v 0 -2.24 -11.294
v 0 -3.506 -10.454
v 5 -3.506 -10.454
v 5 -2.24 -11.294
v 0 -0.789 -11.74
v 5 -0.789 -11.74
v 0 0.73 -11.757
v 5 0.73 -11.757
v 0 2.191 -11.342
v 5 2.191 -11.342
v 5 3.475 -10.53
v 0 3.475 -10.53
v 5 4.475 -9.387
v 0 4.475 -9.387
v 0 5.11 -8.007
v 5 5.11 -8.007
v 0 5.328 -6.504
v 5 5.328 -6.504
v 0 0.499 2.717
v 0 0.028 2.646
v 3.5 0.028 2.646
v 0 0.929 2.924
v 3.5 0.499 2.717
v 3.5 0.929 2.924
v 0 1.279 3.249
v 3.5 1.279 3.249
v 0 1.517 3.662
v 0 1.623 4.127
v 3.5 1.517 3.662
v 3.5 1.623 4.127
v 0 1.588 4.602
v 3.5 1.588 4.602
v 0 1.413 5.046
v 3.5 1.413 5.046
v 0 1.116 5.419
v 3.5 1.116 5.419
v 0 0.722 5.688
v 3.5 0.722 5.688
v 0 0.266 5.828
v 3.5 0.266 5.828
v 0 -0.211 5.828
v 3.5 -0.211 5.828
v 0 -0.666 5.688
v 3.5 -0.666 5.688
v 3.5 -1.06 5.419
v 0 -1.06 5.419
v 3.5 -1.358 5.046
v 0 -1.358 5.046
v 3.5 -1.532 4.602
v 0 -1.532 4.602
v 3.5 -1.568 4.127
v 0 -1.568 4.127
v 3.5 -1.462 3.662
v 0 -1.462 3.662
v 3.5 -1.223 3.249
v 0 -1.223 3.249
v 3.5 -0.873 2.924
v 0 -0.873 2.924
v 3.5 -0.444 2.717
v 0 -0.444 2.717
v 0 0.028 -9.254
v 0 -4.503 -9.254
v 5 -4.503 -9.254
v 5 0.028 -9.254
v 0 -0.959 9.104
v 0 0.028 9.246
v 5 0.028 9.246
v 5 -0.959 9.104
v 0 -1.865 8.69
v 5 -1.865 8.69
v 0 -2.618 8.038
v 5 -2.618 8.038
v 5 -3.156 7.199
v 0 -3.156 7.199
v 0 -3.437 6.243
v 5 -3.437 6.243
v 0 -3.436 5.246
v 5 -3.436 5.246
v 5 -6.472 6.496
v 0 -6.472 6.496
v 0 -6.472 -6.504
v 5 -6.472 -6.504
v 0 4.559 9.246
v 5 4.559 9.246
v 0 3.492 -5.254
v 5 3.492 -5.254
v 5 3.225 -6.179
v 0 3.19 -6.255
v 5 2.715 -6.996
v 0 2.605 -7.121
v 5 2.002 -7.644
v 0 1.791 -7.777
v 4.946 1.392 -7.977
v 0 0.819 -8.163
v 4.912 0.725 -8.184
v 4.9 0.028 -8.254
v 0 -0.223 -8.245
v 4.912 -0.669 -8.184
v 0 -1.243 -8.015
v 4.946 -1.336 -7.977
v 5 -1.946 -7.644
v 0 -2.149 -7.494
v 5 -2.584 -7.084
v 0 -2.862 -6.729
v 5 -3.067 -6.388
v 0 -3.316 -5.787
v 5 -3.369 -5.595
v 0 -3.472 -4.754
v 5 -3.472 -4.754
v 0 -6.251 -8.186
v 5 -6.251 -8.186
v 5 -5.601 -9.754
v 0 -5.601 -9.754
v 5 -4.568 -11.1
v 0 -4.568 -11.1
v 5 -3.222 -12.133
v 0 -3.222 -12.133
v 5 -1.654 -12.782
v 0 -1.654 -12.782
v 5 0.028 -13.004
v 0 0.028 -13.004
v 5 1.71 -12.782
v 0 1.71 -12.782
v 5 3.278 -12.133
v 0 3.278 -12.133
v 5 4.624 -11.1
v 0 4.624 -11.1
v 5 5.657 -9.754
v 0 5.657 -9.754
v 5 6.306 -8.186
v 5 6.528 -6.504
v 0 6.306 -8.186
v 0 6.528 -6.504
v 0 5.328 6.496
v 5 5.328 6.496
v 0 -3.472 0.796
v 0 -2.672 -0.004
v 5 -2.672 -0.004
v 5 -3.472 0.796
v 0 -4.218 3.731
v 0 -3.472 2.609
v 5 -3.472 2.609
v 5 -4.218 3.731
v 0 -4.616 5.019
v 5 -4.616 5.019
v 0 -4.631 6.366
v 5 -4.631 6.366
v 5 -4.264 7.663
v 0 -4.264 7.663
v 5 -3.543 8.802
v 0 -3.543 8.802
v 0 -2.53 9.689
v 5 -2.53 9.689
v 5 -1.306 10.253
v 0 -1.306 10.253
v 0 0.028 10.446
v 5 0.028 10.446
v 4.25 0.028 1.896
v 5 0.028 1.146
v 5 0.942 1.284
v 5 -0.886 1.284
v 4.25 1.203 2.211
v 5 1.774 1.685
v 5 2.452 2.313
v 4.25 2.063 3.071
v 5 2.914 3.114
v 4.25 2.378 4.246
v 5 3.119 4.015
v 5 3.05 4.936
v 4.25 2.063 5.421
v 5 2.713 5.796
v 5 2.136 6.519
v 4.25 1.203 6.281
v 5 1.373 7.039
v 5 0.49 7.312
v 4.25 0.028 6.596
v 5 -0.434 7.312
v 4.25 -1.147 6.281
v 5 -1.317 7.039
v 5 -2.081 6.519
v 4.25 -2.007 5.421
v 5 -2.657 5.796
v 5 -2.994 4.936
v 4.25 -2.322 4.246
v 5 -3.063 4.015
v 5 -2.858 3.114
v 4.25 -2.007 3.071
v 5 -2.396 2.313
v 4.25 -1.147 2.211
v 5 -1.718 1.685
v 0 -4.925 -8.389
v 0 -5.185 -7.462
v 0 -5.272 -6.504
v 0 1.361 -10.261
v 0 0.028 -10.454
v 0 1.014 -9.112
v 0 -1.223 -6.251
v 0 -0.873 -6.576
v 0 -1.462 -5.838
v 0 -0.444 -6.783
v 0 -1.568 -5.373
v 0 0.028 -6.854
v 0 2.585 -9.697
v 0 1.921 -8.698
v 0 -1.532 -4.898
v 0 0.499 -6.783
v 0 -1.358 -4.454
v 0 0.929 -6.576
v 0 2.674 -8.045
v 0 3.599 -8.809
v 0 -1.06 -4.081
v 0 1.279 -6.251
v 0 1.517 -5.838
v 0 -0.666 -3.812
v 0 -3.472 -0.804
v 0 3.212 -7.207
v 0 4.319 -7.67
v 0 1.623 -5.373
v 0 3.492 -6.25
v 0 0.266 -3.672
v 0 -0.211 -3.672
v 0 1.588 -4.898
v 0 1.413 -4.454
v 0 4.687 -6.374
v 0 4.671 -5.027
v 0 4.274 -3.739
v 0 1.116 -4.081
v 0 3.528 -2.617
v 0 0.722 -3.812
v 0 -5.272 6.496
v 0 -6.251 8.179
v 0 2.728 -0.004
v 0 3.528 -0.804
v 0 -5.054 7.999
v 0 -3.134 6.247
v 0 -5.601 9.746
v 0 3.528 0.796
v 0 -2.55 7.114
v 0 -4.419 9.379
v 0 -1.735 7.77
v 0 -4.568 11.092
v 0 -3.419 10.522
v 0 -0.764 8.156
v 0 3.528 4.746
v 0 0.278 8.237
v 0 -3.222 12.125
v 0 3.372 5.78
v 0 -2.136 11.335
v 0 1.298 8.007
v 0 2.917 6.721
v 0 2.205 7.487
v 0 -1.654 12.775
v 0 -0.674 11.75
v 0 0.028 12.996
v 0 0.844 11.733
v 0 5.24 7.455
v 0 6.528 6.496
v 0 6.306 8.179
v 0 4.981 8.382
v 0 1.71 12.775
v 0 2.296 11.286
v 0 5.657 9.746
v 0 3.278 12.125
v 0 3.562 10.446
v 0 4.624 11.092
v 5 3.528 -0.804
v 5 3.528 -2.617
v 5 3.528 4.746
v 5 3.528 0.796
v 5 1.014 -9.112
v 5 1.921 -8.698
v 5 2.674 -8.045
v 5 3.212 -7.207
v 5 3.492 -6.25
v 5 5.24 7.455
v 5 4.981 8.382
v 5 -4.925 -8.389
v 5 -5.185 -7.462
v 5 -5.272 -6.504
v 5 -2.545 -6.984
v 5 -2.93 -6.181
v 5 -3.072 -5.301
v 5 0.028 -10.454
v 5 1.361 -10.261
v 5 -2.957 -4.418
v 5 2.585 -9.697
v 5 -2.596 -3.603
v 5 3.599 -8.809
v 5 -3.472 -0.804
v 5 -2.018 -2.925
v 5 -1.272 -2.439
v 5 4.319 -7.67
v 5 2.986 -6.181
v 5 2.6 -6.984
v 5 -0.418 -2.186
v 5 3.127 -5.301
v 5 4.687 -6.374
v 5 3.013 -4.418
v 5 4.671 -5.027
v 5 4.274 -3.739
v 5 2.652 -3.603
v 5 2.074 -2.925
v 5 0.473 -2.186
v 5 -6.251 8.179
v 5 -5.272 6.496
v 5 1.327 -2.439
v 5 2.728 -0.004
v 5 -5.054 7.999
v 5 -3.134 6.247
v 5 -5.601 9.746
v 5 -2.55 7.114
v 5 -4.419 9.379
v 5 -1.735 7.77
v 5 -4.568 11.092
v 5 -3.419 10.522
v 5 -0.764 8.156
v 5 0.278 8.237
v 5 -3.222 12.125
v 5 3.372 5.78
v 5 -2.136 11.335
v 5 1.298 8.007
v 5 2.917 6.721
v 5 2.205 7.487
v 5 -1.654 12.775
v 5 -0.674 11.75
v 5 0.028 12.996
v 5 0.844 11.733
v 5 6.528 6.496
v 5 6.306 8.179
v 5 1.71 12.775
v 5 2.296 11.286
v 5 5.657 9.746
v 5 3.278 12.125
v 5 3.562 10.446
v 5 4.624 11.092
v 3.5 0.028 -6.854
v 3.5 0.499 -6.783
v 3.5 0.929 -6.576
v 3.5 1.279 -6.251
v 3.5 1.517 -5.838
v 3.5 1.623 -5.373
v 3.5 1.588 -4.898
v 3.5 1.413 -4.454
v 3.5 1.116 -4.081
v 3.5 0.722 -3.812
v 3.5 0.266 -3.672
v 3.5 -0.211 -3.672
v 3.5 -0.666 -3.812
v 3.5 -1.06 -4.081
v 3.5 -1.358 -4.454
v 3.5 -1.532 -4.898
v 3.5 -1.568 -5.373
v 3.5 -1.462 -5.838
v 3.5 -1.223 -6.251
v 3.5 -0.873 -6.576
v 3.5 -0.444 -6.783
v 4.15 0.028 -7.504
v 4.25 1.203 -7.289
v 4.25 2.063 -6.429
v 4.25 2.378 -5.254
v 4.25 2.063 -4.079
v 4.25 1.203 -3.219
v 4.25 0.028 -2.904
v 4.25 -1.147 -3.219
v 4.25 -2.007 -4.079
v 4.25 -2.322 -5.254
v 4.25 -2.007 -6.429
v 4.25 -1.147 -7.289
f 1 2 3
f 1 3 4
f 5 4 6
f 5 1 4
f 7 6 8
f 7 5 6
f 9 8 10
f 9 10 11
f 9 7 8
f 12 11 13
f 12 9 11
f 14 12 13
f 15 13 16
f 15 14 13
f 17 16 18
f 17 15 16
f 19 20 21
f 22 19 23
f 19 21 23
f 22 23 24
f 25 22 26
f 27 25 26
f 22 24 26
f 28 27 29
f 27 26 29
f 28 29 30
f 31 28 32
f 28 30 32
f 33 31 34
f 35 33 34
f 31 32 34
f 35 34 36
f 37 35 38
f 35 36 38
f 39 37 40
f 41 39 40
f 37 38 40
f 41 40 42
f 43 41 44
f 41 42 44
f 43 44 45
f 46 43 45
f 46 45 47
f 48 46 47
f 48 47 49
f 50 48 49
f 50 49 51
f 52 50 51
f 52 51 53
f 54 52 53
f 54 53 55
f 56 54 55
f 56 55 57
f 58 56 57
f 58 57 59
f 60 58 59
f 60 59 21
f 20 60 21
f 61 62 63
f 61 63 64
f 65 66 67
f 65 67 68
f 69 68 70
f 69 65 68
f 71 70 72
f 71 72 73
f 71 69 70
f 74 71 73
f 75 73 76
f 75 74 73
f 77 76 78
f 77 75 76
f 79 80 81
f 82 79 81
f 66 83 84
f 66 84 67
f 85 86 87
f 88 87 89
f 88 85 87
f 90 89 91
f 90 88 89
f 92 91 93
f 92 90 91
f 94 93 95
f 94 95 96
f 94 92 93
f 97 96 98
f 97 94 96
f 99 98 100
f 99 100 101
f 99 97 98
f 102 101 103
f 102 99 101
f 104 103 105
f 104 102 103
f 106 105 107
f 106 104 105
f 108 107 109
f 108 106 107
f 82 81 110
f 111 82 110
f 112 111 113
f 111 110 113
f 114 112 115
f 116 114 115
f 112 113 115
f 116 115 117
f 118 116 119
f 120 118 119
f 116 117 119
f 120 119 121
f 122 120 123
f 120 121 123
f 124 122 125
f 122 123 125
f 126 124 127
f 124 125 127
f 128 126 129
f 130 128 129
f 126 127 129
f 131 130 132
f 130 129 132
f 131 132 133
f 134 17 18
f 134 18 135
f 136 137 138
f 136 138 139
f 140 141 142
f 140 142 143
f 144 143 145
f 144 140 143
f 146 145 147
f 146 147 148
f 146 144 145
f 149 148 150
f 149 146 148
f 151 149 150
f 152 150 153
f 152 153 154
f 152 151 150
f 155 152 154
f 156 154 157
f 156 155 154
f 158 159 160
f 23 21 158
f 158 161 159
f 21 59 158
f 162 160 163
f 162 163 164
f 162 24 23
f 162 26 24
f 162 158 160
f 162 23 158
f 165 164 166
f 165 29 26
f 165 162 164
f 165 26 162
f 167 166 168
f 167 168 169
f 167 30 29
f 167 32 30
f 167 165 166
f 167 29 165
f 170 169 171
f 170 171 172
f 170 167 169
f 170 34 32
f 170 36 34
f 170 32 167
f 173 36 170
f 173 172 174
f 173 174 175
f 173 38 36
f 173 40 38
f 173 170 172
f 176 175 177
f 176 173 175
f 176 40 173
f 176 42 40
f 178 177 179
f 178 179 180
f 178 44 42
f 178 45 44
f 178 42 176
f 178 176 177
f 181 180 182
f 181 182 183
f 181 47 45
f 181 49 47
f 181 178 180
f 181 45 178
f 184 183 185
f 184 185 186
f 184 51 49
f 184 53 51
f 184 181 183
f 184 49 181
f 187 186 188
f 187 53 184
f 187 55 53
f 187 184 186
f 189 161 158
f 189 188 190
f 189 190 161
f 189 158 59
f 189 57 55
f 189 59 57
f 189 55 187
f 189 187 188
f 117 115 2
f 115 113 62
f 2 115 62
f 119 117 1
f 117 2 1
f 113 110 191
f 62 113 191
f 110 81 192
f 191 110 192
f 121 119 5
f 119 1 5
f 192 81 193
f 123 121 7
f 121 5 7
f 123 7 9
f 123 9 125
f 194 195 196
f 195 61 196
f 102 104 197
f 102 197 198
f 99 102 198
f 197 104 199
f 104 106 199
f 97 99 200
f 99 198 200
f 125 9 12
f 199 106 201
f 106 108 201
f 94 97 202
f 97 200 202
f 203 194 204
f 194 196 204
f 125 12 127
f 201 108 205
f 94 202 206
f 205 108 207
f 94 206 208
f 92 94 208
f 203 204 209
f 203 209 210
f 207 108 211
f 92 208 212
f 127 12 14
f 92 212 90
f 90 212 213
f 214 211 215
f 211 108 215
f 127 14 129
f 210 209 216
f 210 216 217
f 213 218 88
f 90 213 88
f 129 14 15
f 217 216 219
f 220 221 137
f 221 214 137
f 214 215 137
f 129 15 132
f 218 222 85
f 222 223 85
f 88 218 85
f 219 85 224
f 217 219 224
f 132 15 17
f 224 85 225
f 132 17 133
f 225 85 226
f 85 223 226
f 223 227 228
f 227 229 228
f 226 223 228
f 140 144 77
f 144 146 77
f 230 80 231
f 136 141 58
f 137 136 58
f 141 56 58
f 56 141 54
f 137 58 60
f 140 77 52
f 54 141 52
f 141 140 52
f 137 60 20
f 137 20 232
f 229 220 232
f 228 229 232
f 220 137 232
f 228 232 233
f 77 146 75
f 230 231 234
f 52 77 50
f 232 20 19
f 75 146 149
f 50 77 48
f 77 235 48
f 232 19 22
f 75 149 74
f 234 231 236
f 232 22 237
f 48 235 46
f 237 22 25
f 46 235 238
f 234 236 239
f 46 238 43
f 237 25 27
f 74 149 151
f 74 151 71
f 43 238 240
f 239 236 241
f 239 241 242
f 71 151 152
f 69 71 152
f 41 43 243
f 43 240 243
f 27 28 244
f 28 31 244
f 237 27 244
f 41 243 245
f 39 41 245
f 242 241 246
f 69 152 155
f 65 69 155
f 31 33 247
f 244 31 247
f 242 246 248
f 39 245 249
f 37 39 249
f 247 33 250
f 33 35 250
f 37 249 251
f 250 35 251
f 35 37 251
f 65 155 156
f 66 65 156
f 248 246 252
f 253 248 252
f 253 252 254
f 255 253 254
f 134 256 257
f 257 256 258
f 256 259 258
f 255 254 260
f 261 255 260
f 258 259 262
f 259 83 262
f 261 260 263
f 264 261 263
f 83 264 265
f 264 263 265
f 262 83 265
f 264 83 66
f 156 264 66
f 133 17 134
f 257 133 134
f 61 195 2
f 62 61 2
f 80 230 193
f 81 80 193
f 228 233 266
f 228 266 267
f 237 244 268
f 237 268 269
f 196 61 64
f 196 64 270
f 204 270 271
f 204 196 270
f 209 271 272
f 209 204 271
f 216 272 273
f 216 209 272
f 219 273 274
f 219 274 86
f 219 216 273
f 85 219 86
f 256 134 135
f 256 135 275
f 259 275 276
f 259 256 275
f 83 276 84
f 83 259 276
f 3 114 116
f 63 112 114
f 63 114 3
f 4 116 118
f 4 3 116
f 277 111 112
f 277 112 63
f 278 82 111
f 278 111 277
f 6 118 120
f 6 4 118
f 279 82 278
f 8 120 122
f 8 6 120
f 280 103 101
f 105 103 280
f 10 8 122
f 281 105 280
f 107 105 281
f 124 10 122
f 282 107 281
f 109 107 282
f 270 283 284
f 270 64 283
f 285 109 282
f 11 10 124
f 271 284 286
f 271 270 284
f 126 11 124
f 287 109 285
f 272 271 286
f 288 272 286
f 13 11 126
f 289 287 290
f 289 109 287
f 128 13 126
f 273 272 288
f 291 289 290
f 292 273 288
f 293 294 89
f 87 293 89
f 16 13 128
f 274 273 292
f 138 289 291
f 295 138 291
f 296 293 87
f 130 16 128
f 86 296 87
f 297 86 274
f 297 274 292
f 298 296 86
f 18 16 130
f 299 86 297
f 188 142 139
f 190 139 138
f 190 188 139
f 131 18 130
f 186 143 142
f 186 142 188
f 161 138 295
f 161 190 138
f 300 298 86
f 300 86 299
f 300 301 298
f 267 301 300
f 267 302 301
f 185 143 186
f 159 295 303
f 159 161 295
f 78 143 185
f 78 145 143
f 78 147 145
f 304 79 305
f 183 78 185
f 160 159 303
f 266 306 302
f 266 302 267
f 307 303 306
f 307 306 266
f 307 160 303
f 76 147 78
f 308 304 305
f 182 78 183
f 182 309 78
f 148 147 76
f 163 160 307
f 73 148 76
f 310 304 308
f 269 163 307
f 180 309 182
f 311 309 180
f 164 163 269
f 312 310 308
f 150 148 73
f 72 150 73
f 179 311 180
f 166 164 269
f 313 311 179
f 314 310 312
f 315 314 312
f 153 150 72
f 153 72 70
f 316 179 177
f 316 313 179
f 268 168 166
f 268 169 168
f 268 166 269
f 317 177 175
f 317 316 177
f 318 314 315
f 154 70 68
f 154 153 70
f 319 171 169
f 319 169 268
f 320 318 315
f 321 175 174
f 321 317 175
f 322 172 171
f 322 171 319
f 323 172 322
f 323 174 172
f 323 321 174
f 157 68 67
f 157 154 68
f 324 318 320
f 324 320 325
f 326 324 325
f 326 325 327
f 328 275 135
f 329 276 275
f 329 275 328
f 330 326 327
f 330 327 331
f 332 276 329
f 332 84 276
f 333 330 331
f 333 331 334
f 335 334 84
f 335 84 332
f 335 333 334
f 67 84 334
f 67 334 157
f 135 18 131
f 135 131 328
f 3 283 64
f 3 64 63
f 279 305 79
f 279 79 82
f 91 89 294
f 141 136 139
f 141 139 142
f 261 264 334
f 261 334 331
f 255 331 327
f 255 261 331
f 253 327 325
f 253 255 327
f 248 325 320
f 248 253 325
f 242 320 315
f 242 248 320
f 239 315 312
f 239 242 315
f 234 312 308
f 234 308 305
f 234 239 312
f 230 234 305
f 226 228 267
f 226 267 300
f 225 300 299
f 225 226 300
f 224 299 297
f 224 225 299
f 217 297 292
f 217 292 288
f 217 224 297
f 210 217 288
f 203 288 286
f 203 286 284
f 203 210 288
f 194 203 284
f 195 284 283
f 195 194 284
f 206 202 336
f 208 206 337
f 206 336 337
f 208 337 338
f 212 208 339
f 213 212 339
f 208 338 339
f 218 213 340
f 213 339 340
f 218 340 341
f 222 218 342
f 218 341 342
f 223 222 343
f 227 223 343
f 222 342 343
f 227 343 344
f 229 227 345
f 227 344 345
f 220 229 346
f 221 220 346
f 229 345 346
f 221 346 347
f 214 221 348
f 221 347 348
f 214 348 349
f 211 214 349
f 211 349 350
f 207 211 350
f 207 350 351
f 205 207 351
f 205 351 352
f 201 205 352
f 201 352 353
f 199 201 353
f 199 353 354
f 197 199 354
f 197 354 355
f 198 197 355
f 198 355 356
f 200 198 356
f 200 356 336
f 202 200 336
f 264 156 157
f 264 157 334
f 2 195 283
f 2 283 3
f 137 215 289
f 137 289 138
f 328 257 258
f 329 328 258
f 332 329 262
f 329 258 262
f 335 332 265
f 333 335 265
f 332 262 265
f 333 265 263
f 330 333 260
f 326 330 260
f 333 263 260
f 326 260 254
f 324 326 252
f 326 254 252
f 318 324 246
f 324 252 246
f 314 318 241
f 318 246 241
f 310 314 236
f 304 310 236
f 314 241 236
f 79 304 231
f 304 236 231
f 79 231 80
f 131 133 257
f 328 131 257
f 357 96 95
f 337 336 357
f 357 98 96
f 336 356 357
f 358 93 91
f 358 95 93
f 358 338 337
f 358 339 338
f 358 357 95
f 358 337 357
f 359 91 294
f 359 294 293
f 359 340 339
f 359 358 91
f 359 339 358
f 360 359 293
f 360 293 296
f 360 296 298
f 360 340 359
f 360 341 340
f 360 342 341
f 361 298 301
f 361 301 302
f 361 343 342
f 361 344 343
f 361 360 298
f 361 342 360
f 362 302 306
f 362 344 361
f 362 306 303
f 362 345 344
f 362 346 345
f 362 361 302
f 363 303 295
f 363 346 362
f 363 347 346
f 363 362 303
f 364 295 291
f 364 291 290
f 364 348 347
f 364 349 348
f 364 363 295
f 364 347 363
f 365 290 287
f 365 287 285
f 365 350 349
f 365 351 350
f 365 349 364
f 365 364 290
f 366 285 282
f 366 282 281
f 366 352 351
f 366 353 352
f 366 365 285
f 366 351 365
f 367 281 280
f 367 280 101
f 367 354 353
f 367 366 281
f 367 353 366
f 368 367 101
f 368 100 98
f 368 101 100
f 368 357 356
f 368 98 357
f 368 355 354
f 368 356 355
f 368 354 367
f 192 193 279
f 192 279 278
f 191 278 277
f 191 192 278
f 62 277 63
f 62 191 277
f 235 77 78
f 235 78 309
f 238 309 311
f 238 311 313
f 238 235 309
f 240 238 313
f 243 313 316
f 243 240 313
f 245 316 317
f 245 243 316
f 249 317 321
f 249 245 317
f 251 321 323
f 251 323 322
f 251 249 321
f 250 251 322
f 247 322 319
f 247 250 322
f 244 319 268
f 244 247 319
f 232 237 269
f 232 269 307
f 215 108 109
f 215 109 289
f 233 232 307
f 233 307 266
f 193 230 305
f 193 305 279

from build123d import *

# Parameters (mm, degrees)
BOSS_EXTRUDE2_DEPTH = 5
SKETCH4_R           = 1.6
CUT_EXTRUDE1_DEPTH  = 10
CHAMFER1_SIZE       = 1.5


with BuildPart() as part:
    # Sketch2 → Boss-Extrude2 (new body)
    with BuildSketch(Plane.YZ):
        with BuildLine():
            Line((-6.472145094, 6.496243265), (-6.472145094, -6.503756735))
            ThreePointArc((-6.472145094, -6.503756735), (0.027854906, -13.003756735), (6.527854906, -6.503756735))
            Line((6.527854906, -6.503756735), (6.527854906, 6.496243265))
            ThreePointArc((6.527854906, 6.496243265), (0.027854906, 12.996243265), (-6.472145094, 6.496243265))
        make_face()
        with BuildLine():
            Line((-5.272145094, 6.496243265), (-5.272145094, -6.503756735))
            ThreePointArc((-5.272145094, -6.503756735), (-5.076205272, -7.931541625), (-4.502873512, -9.253756735))
            Line((-4.502873512, -9.253756735), (0.027854906, -9.253756735))
            ThreePointArc((0.027854906, -9.253756735), (2.673606218, -8.045044583), (3.491956522, -5.253756735))
            ThreePointArc((3.491956522, -5.253756735), (-0.222788612, -8.244770603), (-3.472145094, -4.753756735))
            Line((-3.472145094, -4.753756735), (-3.472145094, -0.803756735))
            Line((-3.472145094, -0.803756735), (-2.672145094, -0.003756735))
            Line((-2.672145094, -0.003756735), (-3.472145094, 0.796243265))
            Line((-3.472145094, 0.796243265), (-3.472145094, 2.609365837))
            ThreePointArc((-3.472145094, 2.609365837), (-4.263608941, 7.662838695), (0.027854906, 10.446243265))
            Line((0.027854906, 10.446243265), (3.561620603, 10.446243265))
            ThreePointArc((3.561620603, 10.446243265), (-2.135596249, 11.334577596), (-5.272145094, 6.496243265))
        make_face(mode=Mode.SUBTRACT)
        with BuildLine():
            Line((4.558583325, 9.246243265), (0.027854906, 9.246243265))
            ThreePointArc((0.027854906, 9.246243265), (-2.617896405, 8.037531112), (-3.436246709, 5.246243265))
            ThreePointArc((-3.436246709, 5.246243265), (0.278498425, 8.237257133), (3.527854906, 4.746243265))
            Line((3.527854906, 4.746243265), (3.527854906, 0.796243265))
            Line((3.527854906, 0.796243265), (2.727854906, -0.003756735))
            Line((2.727854906, -0.003756735), (3.527854906, -0.803756735))
            Line((3.527854906, -0.803756735), (3.527854906, -2.616879307))
            ThreePointArc((3.527854906, -2.616879307), (4.319318754, -7.670352166), (0.027854906, -10.453756735))
            Line((0.027854906, -10.453756735), (-3.50591079, -10.453756735))
            ThreePointArc((-3.50591079, -10.453756735), (2.191306062, -11.342091066), (5.327854906, -6.503756735))
            Line((5.327854906, -6.503756735), (5.327854906, 6.496243265))
            ThreePointArc((5.327854906, 6.496243265), (5.131915085, 7.924028155), (4.558583325, 9.246243265))
        make_face(mode=Mode.SUBTRACT)
    extrude(amount=BOSS_EXTRUDE2_DEPTH)

    # Sketch4 → Cut-Extrude1 (cut)
    with BuildSketch(Plane.YZ.offset(5)):
        with Locations(Location((0.027854906, 4.246243265, 0), (0, 0, 270))):
            Circle(SKETCH4_R)
        with Locations(Location((0.027854906, -5.253756735, 0), (0, 0, 270))):
            Circle(SKETCH4_R)
    extrude(amount=-CUT_EXTRUDE1_DEPTH, mode=Mode.SUBTRACT)

    # Chamfer1
    # the kernel refuses this chamfer: 1.5 mm, written as the material it takes off along each edge
    with BuildSketch(Plane(origin=(5, 0.027854906, 4.246243265), x_dir=(0, 0, -1), z_dir=(0, -1, 0))) as chamfer1_piece_1:
        Polygon((1.6 + CHAMFER1_SIZE, 0), (1.6, -CHAMFER1_SIZE), (1.6, 0), align=None)
    revolve(axis=Axis((5, 0.027854906, 4.246243265), (1, 0, 0)), mode=Mode.SUBTRACT)
    with BuildSketch(Plane(origin=(5, 0.027854906, -5.253756735), x_dir=(0, 0, -1), z_dir=(0, -1, 0))) as chamfer1_piece_2:
        Polygon((1.6 + CHAMFER1_SIZE, 0), (1.6, -CHAMFER1_SIZE), (1.6, 0), align=None)
    revolve(axis=Axis((5, 0.027854906, -5.253756735), (1, 0, 0)), mode=Mode.SUBTRACT)


solid = part.part
